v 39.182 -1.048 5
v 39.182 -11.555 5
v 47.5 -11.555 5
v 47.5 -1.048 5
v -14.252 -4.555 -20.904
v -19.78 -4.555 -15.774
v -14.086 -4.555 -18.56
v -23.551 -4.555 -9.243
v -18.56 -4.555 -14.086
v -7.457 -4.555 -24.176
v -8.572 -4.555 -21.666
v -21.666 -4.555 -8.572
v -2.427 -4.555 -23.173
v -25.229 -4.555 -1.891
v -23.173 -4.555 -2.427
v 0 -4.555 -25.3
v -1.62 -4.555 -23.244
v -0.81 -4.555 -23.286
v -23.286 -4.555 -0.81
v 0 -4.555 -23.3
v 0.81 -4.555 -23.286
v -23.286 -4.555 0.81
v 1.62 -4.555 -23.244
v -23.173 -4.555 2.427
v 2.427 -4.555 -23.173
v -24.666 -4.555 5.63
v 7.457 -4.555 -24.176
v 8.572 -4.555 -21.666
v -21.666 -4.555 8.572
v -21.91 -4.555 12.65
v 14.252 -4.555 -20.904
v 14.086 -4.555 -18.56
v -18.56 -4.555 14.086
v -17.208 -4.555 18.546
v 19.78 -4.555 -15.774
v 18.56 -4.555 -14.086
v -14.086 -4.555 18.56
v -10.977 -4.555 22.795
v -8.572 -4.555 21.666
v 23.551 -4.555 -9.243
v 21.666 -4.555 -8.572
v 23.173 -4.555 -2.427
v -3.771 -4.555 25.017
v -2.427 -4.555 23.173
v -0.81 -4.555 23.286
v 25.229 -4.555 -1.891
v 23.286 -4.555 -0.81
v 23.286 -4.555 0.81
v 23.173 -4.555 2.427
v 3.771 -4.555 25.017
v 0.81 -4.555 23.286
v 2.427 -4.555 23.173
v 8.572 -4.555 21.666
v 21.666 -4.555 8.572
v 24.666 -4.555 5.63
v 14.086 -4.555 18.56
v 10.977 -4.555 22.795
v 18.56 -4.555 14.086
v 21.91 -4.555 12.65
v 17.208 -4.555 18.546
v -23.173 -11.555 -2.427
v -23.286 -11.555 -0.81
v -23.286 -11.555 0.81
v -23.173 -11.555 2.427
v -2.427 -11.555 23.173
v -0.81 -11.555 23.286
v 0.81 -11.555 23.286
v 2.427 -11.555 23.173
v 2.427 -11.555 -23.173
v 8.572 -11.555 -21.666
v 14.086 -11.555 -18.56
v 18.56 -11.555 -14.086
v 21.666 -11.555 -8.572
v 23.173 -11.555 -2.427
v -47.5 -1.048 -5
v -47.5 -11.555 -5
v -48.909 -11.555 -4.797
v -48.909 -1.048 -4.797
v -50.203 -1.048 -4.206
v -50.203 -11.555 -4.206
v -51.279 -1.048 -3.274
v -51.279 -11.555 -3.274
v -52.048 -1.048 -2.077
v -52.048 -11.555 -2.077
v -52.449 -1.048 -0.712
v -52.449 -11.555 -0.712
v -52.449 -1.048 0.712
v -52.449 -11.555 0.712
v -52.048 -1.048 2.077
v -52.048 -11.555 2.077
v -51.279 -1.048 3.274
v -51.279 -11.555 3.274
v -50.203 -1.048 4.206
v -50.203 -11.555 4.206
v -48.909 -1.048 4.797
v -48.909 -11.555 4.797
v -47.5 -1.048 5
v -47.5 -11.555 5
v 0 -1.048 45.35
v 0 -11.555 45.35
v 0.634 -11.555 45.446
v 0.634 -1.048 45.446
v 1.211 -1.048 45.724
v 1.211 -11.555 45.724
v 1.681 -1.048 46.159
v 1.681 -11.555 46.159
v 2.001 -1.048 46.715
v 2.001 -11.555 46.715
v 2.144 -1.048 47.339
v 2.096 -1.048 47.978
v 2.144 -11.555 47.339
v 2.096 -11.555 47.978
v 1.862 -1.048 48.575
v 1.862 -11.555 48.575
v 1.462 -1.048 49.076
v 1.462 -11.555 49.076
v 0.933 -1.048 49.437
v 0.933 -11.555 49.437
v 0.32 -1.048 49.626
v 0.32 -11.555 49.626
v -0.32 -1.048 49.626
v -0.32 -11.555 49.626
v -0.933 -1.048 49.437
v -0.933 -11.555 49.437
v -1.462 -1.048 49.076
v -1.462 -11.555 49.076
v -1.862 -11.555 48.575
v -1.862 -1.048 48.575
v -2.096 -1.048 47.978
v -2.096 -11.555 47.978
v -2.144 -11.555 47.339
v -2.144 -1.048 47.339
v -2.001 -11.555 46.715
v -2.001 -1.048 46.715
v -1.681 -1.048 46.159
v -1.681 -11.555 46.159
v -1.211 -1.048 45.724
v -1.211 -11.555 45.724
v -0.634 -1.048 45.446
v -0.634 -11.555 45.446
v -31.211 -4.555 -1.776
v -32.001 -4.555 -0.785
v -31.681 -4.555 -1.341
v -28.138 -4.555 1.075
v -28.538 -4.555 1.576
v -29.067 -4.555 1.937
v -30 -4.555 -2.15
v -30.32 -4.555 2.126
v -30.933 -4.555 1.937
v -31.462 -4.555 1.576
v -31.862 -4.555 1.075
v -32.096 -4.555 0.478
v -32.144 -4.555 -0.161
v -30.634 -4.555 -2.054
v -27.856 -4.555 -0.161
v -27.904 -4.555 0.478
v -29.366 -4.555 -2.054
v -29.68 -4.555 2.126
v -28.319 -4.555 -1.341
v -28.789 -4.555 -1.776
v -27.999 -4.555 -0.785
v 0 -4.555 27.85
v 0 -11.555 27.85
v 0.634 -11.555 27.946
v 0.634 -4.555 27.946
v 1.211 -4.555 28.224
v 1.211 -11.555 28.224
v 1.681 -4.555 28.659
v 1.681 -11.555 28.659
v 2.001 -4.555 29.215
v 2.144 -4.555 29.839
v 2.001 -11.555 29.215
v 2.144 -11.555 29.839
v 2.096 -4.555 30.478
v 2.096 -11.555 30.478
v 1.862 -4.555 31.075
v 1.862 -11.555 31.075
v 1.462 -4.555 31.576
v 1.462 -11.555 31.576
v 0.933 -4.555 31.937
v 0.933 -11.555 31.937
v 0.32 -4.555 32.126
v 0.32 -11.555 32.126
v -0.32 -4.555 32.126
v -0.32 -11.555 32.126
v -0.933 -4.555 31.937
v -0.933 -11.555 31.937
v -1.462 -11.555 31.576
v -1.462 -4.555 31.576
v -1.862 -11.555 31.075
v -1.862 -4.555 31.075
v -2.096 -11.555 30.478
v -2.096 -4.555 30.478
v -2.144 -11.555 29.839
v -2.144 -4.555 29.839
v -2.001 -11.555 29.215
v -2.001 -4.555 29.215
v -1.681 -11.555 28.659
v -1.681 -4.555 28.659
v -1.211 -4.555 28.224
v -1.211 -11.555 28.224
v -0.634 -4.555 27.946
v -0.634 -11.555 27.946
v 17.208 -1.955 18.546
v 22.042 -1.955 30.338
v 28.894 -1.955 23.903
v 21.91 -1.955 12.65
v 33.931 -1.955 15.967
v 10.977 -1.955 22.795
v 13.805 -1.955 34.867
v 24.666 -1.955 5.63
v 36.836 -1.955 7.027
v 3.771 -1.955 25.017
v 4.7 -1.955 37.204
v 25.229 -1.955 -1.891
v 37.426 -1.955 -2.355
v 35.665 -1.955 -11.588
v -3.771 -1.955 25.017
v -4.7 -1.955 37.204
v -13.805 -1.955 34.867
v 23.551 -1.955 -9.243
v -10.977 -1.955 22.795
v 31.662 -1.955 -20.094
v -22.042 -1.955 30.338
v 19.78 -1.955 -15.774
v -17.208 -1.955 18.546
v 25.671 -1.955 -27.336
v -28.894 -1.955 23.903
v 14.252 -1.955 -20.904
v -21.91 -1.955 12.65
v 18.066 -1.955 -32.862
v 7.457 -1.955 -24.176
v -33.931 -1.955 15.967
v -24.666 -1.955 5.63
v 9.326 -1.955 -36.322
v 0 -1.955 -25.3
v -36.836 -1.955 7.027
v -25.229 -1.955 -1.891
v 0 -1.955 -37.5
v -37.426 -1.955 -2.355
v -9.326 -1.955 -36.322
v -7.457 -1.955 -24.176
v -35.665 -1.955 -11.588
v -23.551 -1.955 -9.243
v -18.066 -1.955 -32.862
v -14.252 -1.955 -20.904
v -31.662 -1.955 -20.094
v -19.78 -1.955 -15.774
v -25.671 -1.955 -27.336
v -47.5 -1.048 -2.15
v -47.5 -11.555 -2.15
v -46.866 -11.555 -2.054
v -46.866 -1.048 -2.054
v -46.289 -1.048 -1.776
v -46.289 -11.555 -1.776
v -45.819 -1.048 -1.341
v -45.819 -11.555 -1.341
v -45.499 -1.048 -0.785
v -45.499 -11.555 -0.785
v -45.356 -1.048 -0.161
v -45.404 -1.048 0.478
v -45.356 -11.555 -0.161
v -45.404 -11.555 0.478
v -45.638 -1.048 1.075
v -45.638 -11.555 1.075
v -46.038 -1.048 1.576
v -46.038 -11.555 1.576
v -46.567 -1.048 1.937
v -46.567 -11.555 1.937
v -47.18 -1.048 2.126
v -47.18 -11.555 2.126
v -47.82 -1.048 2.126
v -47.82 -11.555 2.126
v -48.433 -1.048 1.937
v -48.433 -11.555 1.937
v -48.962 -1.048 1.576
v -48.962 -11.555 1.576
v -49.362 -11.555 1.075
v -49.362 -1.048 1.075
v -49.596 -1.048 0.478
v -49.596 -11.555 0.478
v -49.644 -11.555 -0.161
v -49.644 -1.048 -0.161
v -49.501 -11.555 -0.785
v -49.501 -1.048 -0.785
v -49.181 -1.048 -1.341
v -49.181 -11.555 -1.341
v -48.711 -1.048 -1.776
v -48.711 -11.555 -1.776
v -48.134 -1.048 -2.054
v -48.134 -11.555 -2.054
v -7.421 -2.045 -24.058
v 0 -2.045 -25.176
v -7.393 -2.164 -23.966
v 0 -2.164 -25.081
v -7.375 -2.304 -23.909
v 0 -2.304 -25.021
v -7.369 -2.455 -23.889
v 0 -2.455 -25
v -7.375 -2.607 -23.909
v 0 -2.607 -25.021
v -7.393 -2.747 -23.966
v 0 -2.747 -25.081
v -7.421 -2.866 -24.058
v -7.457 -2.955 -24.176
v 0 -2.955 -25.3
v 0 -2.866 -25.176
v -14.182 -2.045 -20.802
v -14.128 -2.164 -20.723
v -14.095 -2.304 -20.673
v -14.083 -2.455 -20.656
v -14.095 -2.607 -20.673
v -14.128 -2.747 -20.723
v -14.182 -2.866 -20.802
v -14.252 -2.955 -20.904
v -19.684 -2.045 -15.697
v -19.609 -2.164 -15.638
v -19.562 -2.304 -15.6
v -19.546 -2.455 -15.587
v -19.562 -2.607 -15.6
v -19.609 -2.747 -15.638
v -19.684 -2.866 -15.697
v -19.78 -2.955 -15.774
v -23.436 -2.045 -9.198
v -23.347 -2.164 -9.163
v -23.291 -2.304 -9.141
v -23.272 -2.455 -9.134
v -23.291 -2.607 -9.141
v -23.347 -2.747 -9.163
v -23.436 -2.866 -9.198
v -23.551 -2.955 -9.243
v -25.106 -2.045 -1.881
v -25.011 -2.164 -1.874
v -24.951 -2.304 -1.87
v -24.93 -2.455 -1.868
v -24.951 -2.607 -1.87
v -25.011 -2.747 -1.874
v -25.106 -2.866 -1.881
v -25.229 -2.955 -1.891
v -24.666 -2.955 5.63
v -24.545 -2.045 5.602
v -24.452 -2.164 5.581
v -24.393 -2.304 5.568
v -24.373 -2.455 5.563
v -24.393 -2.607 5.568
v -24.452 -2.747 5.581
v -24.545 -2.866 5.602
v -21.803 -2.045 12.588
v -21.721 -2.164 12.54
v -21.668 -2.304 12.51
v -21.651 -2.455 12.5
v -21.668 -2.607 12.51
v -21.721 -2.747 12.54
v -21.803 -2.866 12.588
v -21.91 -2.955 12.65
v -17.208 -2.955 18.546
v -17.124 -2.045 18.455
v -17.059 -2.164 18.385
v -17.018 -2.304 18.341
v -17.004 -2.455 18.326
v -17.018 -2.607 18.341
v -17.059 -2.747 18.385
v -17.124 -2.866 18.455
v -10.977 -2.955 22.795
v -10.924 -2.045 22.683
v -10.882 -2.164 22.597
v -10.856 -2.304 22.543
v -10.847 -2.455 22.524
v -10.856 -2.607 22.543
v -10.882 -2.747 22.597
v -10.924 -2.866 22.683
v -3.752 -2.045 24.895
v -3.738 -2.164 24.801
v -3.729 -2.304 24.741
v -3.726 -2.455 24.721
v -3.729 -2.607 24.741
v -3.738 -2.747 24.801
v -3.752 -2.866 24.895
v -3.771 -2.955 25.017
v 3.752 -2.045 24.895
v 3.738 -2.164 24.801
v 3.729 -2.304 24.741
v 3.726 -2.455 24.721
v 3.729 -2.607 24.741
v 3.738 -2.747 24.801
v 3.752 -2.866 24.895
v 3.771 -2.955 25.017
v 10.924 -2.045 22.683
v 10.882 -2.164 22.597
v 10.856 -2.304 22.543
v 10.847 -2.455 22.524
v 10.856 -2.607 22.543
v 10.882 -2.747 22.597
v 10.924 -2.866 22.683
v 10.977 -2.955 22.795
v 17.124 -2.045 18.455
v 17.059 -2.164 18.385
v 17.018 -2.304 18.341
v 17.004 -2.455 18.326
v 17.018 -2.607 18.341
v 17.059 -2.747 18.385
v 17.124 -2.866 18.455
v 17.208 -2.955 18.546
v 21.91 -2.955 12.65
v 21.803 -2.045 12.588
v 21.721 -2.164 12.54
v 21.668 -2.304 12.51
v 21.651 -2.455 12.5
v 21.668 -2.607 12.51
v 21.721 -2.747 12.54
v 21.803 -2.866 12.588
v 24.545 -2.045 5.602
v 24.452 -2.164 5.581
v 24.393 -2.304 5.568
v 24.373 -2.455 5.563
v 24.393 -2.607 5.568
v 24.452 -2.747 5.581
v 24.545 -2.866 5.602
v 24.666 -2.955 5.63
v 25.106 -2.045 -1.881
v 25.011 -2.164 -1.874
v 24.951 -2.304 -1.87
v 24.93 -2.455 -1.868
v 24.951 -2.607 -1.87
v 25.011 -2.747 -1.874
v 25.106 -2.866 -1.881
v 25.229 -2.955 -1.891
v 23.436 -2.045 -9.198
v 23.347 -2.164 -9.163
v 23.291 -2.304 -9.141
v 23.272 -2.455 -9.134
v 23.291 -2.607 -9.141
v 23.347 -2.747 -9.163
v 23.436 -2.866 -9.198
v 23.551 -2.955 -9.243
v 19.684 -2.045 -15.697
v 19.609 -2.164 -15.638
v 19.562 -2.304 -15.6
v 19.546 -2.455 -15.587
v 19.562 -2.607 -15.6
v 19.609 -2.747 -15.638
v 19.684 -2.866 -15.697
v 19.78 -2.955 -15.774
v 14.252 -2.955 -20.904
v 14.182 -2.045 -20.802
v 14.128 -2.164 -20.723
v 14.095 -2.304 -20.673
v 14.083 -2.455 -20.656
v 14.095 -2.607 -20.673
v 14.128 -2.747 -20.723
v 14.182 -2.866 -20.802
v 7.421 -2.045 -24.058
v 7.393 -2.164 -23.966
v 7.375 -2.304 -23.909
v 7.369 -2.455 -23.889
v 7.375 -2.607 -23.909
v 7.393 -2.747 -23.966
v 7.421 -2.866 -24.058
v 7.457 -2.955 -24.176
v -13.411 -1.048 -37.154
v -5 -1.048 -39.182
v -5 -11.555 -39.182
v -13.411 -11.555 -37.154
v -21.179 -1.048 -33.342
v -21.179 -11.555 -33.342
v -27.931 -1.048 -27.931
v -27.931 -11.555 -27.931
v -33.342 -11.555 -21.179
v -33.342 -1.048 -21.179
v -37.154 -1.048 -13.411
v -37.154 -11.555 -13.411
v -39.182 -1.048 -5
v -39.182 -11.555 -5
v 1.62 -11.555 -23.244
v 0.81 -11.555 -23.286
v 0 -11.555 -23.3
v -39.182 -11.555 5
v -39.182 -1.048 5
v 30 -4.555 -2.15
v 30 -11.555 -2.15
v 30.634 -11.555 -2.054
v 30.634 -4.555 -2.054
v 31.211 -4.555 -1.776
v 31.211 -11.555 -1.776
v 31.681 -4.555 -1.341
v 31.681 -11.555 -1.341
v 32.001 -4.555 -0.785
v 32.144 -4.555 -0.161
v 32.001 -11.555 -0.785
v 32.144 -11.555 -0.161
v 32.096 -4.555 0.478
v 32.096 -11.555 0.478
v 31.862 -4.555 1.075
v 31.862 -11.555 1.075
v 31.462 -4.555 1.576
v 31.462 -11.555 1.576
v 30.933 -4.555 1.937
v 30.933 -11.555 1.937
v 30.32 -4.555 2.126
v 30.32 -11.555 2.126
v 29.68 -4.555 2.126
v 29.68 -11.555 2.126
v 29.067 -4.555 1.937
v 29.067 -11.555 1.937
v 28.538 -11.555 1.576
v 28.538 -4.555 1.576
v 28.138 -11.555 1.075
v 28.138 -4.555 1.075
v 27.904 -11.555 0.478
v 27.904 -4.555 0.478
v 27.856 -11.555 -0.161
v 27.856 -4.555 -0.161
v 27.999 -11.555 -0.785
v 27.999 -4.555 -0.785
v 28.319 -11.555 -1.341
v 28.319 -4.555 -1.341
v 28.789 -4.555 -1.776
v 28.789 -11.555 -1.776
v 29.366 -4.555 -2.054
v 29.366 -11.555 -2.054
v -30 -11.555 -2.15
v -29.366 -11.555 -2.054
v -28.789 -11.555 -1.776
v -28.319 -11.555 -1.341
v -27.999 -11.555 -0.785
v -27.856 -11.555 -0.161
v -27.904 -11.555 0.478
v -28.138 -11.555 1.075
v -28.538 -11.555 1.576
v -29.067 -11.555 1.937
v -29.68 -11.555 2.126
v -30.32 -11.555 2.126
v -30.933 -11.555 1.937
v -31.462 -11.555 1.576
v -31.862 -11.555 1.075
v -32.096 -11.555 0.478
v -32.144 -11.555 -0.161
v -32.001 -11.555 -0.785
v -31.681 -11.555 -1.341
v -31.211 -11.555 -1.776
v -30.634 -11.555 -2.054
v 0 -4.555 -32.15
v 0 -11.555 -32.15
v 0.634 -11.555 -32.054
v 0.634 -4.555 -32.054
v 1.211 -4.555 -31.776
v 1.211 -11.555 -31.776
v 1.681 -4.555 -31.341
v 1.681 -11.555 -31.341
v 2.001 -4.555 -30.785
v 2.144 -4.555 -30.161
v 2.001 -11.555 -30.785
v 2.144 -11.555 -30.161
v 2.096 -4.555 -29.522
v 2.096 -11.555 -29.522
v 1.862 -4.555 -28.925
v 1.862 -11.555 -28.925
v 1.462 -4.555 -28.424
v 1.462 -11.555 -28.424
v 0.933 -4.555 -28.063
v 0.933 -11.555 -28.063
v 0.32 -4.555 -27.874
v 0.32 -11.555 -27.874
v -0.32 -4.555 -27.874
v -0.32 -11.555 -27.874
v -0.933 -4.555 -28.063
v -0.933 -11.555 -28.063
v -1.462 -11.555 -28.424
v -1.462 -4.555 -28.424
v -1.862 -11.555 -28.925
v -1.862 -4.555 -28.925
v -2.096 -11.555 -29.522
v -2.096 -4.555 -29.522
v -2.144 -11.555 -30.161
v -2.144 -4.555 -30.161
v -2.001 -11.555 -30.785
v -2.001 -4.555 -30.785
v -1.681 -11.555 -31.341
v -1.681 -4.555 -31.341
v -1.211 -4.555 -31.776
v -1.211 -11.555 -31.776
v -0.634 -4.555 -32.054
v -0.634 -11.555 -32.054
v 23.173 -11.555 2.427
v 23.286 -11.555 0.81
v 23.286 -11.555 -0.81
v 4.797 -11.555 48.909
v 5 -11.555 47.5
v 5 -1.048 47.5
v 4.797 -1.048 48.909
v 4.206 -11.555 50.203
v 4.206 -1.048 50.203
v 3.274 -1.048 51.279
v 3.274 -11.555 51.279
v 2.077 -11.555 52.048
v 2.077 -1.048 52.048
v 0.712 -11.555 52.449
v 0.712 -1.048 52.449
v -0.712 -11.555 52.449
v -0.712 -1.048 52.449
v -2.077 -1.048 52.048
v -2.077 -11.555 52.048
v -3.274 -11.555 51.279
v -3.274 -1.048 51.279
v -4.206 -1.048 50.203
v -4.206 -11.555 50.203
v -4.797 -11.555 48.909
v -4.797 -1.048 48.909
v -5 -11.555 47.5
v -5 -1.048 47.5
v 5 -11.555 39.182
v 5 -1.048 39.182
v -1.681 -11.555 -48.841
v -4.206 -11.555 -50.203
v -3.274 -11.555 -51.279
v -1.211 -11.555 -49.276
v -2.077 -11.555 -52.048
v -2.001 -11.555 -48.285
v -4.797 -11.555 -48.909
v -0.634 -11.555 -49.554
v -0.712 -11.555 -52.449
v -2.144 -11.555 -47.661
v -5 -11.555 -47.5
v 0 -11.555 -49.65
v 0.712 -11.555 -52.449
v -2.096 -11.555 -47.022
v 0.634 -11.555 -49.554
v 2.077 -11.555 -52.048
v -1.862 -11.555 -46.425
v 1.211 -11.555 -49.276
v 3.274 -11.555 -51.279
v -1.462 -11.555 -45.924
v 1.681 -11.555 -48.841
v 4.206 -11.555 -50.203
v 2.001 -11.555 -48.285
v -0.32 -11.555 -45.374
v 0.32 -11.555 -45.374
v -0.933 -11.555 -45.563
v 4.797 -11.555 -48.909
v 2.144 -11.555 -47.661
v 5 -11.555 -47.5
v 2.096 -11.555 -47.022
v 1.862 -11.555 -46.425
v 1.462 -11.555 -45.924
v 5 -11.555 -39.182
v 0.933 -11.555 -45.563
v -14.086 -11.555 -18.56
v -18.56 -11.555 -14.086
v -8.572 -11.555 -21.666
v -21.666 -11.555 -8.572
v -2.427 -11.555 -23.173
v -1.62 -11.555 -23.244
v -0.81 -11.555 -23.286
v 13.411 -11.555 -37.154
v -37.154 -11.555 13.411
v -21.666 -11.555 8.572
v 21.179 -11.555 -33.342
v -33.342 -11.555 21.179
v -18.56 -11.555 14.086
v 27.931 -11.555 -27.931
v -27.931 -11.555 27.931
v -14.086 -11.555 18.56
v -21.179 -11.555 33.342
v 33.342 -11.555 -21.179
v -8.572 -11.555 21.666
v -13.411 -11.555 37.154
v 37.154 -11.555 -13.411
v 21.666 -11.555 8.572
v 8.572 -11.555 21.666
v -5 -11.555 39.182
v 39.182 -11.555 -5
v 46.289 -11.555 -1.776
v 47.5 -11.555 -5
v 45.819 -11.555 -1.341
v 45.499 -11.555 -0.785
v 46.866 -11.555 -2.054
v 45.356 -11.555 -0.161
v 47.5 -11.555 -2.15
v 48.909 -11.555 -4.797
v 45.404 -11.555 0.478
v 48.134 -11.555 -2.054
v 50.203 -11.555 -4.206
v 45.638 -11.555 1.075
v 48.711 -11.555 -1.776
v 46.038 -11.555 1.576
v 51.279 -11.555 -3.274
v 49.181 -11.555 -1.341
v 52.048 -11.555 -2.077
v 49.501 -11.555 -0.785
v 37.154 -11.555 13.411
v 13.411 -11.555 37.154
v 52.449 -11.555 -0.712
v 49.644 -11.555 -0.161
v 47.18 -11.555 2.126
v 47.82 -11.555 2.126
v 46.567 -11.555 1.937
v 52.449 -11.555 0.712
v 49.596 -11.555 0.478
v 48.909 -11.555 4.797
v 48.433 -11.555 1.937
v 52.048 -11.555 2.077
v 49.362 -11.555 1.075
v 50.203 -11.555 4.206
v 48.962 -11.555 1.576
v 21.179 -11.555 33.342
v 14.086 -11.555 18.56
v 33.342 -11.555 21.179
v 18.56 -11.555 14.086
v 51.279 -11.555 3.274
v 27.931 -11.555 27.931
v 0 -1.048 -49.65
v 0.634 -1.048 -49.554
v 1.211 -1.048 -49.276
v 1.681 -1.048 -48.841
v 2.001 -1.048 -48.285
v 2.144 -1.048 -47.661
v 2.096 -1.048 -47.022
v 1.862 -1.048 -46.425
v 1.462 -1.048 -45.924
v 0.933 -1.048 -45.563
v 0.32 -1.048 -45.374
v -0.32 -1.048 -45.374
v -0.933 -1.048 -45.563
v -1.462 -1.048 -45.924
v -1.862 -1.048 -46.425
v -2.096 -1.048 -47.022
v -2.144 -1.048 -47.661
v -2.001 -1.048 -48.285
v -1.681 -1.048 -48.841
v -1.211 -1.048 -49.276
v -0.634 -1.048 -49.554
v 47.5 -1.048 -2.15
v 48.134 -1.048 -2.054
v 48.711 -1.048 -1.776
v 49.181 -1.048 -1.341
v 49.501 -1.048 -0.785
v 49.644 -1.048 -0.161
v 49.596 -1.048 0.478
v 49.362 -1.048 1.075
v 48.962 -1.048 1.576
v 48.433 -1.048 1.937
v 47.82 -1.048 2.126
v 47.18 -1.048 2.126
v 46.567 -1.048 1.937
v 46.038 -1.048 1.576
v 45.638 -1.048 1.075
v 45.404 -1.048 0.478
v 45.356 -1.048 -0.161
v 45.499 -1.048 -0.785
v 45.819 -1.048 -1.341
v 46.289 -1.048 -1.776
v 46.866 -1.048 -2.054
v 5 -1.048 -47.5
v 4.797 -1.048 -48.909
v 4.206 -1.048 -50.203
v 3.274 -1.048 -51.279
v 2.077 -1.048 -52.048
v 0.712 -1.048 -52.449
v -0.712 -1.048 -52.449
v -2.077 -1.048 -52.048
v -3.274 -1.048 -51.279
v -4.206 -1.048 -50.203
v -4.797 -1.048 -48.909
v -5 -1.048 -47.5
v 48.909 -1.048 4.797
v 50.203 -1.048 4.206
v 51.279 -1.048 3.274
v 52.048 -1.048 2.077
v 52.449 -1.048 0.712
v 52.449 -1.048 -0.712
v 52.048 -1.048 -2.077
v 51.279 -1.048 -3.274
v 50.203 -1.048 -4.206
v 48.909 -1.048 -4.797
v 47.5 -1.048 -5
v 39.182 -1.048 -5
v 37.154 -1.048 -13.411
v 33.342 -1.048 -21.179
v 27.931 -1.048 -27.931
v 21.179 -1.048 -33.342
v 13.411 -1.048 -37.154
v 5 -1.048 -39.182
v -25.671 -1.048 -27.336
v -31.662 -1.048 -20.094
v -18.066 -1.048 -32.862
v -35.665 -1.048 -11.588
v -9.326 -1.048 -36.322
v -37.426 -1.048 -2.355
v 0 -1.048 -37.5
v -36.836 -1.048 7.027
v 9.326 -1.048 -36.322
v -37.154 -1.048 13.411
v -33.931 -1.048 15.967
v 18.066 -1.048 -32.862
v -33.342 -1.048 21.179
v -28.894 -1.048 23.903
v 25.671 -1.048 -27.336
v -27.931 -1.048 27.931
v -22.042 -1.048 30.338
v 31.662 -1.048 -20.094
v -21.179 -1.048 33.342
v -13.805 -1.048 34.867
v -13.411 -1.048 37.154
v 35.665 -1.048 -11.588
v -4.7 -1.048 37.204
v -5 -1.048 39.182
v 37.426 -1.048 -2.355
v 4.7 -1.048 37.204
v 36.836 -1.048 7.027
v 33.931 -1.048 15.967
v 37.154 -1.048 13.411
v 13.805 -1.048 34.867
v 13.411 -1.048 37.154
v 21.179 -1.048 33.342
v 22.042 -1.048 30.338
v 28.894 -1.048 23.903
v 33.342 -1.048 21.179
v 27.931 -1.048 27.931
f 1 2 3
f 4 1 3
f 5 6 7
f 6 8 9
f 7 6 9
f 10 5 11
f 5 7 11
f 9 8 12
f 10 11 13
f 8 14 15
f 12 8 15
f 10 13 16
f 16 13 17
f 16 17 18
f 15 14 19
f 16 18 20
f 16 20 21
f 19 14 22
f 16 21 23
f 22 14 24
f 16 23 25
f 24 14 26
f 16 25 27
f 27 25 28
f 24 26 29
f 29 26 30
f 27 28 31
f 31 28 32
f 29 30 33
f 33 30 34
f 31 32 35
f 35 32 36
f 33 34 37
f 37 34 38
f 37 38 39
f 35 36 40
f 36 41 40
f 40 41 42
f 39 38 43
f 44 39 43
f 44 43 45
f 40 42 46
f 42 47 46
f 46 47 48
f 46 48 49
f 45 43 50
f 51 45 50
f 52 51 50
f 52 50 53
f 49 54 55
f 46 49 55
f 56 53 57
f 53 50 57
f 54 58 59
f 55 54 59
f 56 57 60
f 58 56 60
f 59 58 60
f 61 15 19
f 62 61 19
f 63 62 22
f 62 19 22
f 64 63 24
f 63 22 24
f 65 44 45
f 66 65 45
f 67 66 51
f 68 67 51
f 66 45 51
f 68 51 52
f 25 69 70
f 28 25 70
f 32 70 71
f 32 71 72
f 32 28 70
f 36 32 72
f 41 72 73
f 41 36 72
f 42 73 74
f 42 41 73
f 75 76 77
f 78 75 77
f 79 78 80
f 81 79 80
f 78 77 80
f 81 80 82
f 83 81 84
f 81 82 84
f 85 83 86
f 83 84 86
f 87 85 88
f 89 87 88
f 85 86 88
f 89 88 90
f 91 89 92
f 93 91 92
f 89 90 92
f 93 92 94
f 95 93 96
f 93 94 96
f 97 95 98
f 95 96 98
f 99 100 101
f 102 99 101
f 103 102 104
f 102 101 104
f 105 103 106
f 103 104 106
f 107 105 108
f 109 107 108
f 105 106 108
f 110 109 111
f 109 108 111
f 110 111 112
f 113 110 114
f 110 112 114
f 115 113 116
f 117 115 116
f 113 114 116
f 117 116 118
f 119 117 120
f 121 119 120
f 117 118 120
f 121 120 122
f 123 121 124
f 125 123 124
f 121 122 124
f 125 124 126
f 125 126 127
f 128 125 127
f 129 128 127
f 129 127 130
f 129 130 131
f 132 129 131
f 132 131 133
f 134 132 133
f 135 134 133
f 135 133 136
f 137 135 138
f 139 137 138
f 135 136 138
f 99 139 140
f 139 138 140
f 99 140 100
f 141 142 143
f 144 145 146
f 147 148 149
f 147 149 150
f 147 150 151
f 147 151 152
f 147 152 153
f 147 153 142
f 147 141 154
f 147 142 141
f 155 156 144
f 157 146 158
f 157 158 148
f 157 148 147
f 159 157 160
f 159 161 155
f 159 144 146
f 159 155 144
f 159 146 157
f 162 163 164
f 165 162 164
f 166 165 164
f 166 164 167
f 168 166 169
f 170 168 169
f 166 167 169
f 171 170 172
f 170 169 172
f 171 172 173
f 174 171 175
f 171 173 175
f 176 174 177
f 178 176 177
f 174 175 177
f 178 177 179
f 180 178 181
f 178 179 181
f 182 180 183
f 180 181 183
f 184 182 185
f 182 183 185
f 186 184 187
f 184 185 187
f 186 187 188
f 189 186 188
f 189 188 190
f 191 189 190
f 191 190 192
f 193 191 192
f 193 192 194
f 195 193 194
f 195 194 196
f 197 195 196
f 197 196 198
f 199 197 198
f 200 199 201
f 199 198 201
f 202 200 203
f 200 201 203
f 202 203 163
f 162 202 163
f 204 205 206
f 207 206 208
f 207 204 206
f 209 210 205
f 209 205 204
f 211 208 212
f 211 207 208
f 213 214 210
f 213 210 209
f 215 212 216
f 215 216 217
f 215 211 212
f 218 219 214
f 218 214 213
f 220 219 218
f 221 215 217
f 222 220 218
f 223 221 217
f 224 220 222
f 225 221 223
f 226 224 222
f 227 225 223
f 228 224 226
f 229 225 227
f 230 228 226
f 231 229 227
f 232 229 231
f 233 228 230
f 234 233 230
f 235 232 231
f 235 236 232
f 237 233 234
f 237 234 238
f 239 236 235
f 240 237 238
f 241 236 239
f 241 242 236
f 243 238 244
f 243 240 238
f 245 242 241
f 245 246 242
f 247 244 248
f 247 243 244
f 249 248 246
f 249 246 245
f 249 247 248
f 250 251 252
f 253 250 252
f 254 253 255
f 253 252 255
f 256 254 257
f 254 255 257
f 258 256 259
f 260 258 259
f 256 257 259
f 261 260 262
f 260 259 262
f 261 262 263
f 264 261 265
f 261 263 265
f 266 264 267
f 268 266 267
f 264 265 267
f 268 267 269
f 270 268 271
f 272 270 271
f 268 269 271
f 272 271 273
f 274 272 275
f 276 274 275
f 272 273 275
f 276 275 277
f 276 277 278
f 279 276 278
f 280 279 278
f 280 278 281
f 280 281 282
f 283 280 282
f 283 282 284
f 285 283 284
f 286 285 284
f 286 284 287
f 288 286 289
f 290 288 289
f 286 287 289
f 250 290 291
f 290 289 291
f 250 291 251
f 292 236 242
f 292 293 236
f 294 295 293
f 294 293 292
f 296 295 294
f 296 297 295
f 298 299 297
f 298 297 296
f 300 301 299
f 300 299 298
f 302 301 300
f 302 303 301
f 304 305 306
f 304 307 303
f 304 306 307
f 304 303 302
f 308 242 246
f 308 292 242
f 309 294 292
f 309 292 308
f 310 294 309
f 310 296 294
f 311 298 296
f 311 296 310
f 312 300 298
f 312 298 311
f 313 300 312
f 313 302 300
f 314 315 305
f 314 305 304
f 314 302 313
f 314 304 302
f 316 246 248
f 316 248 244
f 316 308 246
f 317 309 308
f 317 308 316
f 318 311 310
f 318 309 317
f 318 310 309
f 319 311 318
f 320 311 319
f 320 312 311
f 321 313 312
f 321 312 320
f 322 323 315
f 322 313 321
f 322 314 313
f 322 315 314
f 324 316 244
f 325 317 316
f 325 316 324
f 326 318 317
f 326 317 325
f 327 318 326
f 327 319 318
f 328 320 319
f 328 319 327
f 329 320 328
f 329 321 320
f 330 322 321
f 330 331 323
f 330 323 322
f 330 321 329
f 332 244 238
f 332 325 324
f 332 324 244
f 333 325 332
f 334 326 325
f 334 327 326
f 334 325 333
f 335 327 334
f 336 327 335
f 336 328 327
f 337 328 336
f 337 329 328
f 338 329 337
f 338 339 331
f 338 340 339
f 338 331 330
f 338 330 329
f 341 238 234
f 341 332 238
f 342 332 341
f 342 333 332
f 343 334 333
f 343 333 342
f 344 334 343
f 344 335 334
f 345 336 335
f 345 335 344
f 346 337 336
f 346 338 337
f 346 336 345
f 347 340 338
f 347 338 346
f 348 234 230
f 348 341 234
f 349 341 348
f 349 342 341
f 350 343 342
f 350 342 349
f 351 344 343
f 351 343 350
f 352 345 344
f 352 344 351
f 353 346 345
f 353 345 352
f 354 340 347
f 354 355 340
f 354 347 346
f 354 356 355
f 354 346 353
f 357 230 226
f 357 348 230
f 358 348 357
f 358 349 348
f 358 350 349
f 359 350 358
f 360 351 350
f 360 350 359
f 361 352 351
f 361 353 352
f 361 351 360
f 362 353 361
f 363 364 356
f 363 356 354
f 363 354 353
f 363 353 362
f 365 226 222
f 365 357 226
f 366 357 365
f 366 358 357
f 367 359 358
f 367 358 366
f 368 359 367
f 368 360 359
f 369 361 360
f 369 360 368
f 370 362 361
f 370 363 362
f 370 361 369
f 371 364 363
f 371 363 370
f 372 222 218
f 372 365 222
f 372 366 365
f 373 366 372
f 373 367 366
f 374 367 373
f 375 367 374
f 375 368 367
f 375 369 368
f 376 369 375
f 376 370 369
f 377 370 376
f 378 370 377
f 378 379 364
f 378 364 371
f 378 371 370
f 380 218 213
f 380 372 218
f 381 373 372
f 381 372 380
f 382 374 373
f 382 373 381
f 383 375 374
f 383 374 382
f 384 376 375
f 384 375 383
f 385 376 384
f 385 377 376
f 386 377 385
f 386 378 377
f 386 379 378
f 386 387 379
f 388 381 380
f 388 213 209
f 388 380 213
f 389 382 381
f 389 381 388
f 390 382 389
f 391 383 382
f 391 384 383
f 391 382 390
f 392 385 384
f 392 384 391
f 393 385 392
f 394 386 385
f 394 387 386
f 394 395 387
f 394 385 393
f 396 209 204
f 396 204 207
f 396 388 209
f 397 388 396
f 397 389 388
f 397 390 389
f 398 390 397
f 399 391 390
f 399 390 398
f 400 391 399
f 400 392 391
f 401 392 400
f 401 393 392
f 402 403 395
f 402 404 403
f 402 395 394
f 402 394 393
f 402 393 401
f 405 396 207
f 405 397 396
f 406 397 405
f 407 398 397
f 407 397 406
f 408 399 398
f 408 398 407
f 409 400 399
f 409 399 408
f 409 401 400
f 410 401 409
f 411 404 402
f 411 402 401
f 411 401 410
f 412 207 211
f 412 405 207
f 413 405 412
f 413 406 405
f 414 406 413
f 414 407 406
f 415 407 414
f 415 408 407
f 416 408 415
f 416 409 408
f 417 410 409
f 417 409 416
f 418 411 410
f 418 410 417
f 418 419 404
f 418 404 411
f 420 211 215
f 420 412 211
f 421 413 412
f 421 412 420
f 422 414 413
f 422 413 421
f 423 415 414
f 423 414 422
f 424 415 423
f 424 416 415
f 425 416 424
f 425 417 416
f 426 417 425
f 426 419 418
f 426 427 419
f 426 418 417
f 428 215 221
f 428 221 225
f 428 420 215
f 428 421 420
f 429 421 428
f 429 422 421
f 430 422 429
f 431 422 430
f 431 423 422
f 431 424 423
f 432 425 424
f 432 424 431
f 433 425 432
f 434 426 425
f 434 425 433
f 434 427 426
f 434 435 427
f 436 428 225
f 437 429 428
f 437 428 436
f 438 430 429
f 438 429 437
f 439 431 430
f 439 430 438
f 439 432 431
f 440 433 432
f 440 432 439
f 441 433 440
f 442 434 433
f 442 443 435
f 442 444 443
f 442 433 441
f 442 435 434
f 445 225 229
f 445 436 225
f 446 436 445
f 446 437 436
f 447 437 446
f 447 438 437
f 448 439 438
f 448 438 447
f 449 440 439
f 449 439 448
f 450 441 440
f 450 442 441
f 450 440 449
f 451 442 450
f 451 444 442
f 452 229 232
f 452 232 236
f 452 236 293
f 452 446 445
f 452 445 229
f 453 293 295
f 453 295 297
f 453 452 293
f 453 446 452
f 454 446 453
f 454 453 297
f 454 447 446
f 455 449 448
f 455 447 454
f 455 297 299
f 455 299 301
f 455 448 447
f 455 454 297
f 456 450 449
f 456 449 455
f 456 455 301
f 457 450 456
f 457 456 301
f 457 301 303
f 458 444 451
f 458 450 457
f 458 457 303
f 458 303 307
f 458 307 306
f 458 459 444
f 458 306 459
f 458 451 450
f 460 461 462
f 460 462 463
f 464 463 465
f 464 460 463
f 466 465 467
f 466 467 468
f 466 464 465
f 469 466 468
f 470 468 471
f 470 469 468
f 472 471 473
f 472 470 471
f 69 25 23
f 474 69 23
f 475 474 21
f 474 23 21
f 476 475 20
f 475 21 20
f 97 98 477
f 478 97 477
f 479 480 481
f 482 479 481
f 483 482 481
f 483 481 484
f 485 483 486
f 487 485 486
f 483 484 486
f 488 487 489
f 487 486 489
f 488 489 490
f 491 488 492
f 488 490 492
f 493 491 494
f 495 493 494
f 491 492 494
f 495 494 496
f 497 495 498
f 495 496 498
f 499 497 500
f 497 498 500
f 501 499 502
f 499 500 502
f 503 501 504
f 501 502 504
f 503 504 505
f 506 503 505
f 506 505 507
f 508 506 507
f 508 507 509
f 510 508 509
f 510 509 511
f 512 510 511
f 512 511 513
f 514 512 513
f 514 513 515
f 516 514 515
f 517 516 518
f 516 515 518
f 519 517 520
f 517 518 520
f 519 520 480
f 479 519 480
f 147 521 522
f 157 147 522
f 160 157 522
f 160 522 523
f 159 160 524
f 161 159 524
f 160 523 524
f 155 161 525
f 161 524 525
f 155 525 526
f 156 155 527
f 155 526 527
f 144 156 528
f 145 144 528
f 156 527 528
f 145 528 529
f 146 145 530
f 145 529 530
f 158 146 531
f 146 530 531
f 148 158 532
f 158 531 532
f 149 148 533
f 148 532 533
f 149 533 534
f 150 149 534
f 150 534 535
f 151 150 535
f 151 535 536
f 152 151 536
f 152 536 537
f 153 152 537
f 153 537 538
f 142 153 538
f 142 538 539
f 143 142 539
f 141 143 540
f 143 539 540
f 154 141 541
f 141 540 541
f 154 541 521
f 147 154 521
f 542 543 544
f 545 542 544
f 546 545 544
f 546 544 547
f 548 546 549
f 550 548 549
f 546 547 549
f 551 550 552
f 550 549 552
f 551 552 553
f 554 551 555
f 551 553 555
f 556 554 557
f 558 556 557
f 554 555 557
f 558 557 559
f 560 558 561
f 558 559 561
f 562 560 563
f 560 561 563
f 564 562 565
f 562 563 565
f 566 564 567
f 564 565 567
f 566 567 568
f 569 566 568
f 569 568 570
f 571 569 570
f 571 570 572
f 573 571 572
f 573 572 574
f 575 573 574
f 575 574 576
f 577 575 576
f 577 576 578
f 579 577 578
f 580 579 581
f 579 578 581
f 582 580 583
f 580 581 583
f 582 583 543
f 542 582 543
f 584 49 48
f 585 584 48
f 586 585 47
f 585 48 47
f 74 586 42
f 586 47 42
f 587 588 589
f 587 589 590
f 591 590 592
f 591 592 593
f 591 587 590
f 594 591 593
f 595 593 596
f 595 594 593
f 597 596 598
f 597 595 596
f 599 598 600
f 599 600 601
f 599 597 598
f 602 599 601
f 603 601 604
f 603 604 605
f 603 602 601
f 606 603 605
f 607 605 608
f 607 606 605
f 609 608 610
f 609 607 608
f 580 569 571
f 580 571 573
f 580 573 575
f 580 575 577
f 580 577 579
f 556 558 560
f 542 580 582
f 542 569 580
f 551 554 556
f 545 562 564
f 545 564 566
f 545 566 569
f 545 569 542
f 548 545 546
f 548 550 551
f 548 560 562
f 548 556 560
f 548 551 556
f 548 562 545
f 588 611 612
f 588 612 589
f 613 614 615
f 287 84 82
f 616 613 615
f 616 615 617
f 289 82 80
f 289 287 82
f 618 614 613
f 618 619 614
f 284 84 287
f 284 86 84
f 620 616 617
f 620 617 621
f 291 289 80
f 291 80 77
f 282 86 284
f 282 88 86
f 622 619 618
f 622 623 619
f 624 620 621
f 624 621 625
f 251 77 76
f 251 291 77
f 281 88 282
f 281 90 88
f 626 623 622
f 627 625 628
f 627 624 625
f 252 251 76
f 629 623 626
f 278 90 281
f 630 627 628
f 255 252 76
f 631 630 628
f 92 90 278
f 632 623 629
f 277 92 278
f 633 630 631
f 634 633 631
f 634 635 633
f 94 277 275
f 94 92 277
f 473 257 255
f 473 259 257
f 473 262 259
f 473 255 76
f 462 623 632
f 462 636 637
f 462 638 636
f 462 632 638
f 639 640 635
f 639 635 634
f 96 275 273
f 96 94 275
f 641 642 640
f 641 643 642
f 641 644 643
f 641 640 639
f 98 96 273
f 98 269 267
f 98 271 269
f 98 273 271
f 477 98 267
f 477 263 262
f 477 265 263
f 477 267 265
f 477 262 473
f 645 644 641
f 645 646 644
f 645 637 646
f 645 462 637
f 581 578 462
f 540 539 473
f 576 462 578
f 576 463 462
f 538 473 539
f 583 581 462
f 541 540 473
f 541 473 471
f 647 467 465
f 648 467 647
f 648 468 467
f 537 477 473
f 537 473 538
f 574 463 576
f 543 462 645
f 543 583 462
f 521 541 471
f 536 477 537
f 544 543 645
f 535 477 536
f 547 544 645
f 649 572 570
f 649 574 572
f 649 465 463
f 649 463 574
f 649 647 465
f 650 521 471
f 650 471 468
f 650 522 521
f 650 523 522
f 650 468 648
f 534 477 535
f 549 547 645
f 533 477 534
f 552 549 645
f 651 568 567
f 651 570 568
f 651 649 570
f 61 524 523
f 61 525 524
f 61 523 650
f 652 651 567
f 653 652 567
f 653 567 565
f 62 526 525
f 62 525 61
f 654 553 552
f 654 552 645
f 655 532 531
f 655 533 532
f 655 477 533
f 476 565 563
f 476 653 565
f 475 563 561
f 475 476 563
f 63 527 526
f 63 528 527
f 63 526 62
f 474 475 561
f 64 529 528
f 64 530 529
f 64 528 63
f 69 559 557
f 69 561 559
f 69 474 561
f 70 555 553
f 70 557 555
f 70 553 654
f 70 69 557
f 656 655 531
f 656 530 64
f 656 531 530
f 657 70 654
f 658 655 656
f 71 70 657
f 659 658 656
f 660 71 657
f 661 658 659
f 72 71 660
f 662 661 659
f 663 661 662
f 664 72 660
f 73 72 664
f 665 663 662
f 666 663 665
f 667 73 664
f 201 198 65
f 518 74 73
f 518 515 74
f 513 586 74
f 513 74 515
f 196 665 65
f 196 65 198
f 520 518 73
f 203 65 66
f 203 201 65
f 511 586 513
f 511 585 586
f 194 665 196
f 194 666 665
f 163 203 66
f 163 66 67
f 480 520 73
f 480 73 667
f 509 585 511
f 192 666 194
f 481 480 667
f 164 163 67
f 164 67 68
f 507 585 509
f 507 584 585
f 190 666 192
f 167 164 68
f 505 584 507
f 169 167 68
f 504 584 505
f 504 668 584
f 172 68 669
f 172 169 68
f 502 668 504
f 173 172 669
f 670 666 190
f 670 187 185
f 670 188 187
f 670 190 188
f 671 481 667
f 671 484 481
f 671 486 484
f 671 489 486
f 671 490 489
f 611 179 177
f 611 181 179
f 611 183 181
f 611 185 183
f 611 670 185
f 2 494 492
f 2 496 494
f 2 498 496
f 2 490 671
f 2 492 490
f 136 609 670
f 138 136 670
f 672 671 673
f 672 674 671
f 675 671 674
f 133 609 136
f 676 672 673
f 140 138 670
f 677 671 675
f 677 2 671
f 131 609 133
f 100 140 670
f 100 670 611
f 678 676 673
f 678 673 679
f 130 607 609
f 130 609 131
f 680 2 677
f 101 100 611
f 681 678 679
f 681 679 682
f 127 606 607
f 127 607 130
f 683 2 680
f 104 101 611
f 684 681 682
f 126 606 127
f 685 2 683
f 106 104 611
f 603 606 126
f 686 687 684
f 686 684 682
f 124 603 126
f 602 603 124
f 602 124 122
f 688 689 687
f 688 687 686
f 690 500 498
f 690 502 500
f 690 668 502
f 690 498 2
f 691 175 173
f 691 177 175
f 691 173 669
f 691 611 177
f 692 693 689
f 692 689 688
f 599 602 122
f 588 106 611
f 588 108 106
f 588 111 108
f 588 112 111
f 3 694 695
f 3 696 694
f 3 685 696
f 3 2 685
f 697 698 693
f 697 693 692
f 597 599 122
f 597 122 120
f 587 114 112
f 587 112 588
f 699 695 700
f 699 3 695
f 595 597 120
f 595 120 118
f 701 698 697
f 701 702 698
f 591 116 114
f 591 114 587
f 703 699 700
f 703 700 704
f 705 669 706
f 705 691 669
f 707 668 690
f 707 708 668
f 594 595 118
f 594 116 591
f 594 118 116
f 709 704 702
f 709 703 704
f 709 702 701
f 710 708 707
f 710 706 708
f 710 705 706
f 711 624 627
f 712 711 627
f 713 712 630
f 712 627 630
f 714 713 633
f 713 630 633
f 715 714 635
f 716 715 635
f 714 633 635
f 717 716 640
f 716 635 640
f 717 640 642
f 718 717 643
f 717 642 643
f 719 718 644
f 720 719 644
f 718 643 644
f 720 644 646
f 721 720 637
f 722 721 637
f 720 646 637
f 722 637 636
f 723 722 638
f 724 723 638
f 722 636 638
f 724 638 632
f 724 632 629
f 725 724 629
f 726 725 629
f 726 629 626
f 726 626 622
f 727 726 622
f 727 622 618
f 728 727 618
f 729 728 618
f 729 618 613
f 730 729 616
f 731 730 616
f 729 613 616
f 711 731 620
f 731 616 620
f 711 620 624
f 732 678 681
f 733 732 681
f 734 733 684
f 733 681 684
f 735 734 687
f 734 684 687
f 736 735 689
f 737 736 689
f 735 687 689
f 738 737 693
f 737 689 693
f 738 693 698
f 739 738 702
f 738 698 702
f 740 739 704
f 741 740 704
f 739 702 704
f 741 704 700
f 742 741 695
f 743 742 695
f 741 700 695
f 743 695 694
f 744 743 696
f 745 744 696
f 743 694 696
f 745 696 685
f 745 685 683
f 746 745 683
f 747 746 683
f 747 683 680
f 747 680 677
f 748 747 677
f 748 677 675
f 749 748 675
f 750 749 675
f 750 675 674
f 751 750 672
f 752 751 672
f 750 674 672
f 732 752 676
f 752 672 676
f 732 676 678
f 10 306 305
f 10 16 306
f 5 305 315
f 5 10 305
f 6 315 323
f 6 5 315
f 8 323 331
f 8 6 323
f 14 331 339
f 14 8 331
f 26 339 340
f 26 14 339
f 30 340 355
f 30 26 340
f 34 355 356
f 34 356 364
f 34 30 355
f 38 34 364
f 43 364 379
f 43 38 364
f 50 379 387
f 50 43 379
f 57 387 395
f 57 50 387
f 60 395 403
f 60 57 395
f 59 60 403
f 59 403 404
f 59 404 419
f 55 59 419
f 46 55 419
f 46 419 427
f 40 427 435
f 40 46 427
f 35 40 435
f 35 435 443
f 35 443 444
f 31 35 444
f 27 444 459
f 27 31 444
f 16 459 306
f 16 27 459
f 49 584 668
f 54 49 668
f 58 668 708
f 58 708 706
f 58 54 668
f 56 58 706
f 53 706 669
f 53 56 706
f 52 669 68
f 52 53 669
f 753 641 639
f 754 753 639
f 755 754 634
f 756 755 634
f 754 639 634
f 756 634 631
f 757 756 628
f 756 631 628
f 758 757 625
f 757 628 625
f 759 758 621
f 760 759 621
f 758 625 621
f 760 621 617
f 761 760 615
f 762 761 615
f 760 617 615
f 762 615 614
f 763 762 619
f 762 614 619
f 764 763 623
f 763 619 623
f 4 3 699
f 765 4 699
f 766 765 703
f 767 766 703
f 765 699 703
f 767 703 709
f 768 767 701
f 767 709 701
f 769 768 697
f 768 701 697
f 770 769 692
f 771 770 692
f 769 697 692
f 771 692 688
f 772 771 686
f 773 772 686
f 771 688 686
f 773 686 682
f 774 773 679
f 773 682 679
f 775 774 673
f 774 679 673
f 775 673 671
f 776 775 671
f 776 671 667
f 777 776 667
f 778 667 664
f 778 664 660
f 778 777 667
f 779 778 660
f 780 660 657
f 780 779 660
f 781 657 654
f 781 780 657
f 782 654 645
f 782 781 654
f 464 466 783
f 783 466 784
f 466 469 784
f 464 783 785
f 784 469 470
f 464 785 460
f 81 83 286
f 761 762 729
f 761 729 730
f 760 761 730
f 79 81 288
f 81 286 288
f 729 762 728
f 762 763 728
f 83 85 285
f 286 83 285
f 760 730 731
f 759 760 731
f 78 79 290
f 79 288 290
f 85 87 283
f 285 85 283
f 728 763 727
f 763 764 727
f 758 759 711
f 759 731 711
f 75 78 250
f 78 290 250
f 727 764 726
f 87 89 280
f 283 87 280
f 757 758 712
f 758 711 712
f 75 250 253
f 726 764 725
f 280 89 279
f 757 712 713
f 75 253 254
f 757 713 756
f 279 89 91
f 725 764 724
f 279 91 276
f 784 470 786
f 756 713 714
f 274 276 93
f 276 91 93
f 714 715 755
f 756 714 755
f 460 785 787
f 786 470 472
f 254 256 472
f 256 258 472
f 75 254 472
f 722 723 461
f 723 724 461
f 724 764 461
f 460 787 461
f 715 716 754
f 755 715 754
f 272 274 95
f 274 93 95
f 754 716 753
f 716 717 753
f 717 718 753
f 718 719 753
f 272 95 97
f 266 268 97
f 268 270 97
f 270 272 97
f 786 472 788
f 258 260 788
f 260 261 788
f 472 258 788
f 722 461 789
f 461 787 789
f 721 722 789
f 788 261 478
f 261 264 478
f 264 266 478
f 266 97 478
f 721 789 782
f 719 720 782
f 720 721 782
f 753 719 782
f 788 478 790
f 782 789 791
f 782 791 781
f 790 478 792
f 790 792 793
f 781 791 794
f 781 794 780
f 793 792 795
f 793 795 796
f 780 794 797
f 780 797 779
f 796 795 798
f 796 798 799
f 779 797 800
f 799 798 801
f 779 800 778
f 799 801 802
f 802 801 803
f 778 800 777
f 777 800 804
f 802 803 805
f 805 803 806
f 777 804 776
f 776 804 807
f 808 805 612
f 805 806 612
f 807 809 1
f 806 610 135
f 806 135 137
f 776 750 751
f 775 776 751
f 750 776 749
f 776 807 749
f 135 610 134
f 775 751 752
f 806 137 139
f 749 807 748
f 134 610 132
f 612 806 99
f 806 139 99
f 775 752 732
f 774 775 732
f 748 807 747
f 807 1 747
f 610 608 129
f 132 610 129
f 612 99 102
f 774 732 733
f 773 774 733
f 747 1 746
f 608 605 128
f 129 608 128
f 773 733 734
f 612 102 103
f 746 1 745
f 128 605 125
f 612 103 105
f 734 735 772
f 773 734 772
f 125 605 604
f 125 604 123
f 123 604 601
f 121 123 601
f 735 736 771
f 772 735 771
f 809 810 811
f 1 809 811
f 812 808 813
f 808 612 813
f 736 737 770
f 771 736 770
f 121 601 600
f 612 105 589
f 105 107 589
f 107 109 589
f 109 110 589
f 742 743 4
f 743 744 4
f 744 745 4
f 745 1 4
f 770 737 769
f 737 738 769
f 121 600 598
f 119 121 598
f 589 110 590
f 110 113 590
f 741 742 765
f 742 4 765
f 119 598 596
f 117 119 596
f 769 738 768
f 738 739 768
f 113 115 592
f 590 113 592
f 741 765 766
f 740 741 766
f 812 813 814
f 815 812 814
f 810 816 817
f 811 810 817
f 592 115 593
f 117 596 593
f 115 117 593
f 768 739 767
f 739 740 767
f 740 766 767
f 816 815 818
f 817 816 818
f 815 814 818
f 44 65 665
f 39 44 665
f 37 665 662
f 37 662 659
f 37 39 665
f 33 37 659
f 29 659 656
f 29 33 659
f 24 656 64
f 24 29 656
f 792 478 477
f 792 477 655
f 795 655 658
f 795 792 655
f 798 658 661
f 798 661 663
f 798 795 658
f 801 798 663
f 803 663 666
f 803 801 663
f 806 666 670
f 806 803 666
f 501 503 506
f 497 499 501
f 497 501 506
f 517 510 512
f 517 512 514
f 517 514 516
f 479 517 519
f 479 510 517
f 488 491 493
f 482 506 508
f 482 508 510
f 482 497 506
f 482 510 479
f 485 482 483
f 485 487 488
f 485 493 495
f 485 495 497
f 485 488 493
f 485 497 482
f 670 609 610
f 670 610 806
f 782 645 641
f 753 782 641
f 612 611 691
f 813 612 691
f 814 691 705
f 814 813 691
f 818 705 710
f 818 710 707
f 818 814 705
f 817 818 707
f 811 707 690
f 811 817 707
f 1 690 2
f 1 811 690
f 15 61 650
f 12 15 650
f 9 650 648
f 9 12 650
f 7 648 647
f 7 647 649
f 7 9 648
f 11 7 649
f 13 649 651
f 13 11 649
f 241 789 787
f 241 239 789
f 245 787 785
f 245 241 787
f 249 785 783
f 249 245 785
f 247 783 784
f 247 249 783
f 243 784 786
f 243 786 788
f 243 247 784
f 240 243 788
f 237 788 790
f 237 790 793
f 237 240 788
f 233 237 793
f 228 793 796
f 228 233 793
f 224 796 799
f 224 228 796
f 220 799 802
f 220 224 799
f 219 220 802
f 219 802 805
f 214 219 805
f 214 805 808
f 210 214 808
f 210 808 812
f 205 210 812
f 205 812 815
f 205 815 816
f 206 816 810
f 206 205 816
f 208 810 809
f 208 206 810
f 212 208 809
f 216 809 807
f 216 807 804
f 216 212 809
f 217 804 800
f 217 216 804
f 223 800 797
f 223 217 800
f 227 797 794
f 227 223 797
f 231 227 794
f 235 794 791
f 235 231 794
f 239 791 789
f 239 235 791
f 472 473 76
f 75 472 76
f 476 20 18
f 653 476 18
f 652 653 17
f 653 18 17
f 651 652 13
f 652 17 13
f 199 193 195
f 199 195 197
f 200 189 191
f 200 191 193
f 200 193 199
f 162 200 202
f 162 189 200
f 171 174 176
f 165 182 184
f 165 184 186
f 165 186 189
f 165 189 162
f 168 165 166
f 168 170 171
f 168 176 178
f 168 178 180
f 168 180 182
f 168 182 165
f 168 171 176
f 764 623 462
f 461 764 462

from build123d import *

# Parameters (mm, degrees)
SKETCH2_R           = 2.15
BOSS_EXTRUDE1_DEPTH = 10.507214
CUT_EXTRUDE2_DEPTH  = 7
SKETCH4_R           = 2.15
CUT_EXTRUDE3_DEPTH  = 7
BOSS_EXTRUDE2_START = -7
SKETCH5_R           = 24.3
SKETCH5_R_2         = 23.3
BOSS_EXTRUDE2_DEPTH = 7
SKETCH6_R           = 23.3
CUT_EXTRUDE4_DEPTH  = 75.575465


with BuildPart() as part:
    # Sketch1 → Revolve1 (revolve)
    with BuildSketch(Plane(origin=(0, 0, 0), x_dir=(0, 0, -1), z_dir=(1, 0, 0)), mode=Mode.PRIVATE) as revolve1_sk:
        with BuildLine():
            Line((-37.5, -1.048229), (-37.5, -1.955443))
            Line((-37.5, -1.955443), (-25.3, -1.955443))
            ThreePointArc((-25.3, -1.955443), (-25, -2.455443), (-25.3, -2.955443))
            Line((-25.3, -2.955443), (-25.3, -4.555443))
            Line((-25.3, -4.555443), (-8, -4.555443))
            Line((-8, -4.555443), (-8, -11.555443))
            Line((-8, -11.555443), (-39.5, -11.555443))
            Line((-39.5, -11.555443), (-39.5, -1.048229))
            Line((-39.5, -1.048229), (-37.5, -1.048229))
        make_face()
    revolve(revolve1_sk.sketch.rotate(Axis((0, -1000, 0), (0, 1, 0)), 180), axis=Axis((0, -1000, 0), (0, 1, 0)))

    # Sketch2 → Boss-Extrude1 (add)
    # profile 1 of 4: a face of its own
    with BuildSketch(Plane.XZ.offset(11.555443)):
        with BuildLine():
            Line((-5, 47.5), (-5, 39.182266))
            Line((-5, 39.182266), (5, 39.182266))
            Line((5, 39.182266), (5, 47.5))
            ThreePointArc((5, 47.5), (0, 52.5), (-5, 47.5))
        make_face()
        with Locations(Location((0, 47.5, 0), (0, 0, 270))):
            Circle(SKETCH2_R, mode=Mode.SUBTRACT)
    # profile 2 of 4: a face of its own
    with BuildSketch(Plane.XZ.offset(11.555443)):
        with BuildLine():
            Line((47.5, -5), (39.182266, -5))
            Line((39.182266, -5), (39.182266, 5))
            Line((39.182266, 5), (47.5, 5))
            ThreePointArc((47.5, 5), (52.5, 0), (47.5, -5))
        make_face()
        with Locations(Location((47.5, 0, 0), (0, 0, 270))):
            Circle(SKETCH2_R, mode=Mode.SUBTRACT)
    # profile 3 of 4: a face of its own
    with BuildSketch(Plane.XZ.offset(11.555443)):
        with BuildLine():
            Line((-5, -47.5), (-5, -39.182266))
            Line((-5, -39.182266), (5, -39.182266))
            Line((5, -39.182266), (5, -47.5))
            ThreePointArc((5, -47.5), (0, -52.5), (-5, -47.5))
        make_face()
        with Locations(Location((0, -47.5, 0), (0, 0, 270))):
            Circle(SKETCH2_R, mode=Mode.SUBTRACT)
    # profile 4 of 4: a face of its own
    with BuildSketch(Plane.XZ.offset(11.555443)):
        with BuildLine():
            Line((-47.5, 5), (-39.182266, 5))
            Line((-39.182266, 5), (-39.182266, -5))
            Line((-39.182266, -5), (-47.5, -5))
            ThreePointArc((-47.5, -5), (-52.5, 0), (-47.5, 5))
        make_face()
        with Locations(Location((-47.5, 0, 0), (0, 0, 270))):
            Circle(SKETCH2_R, mode=Mode.SUBTRACT)
    extrude(amount=-BOSS_EXTRUDE1_DEPTH)

    # Sketch3 → Cut-Extrude2 (cut)
    with BuildSketch(Plane(origin=(0, -4.555443, 0), x_dir=(1, 0, 0), z_dir=(0, 1, 0))):
        with BuildLine():
            Line((21.938323, -2), (12.369317, -2))
            ThreePointArc((12.369317, -2), (11.19262, -2.382785), (10.466345, -3.384615))
            ThreePointArc((10.466345, -3.384615), (7.778175, -7.778175), (3.384615, -10.466345))
            ThreePointArc((3.384615, -10.466345), (2.382785, -11.19262), (2, -12.369317))
            Line((2, -12.369317), (2, -21.938323))
            ThreePointArc((2, -21.938323), (2.718885, -23.474143), (4.358744, -23.905885))
            ThreePointArc((4.358744, -23.905885), (17.182695, -17.182695), (23.905885, -4.358744))
            ThreePointArc((23.905885, -4.358744), (23.474143, -2.718885), (21.938323, -2))
        make_face()
        with BuildLine():
            Line((-2, -21.938323), (-2, -12.369317))
            ThreePointArc((-2, -12.369317), (-2.382785, -11.19262), (-3.384615, -10.466345))
            ThreePointArc((-3.384615, -10.466345), (-7.778175, -7.778175), (-10.466345, -3.384615))
            ThreePointArc((-10.466345, -3.384615), (-11.19262, -2.382785), (-12.369317, -2))
            Line((-12.369317, -2), (-21.938323, -2))
            ThreePointArc((-21.938323, -2), (-23.474143, -2.718885), (-23.905885, -4.358744))
            ThreePointArc((-23.905885, -4.358744), (-17.182695, -17.182695), (-4.358744, -23.905885))
            ThreePointArc((-4.358744, -23.905885), (-2.718885, -23.474143), (-2, -21.938323))
        make_face()
        with BuildLine():
            Line((-21.938323, 2), (-12.369317, 2))
            ThreePointArc((-12.369317, 2), (-11.19262, 2.382785), (-10.466345, 3.384615))
            ThreePointArc((-10.466345, 3.384615), (-7.778175, 7.778175), (-3.384615, 10.466345))
            ThreePointArc((-3.384615, 10.466345), (-2.382785, 11.19262), (-2, 12.369317))
            Line((-2, 12.369317), (-2, 21.938323))
            ThreePointArc((-2, 21.938323), (-2.718885, 23.474143), (-4.358744, 23.905885))
            ThreePointArc((-4.358744, 23.905885), (-17.182695, 17.182695), (-23.905885, 4.358744))
            ThreePointArc((-23.905885, 4.358744), (-23.474143, 2.718885), (-21.938323, 2))
        make_face()
        with BuildLine():
            Line((2, 21.938323), (2, 12.369317))
            ThreePointArc((2, 12.369317), (2.382785, 11.19262), (3.384615, 10.466345))
            ThreePointArc((3.384615, 10.466345), (7.778175, 7.778175), (10.466345, 3.384615))
            ThreePointArc((10.466345, 3.384615), (11.19262, 2.382785), (12.369317, 2))
            Line((12.369317, 2), (21.938323, 2))
            ThreePointArc((21.938323, 2), (23.474143, 2.718885), (23.905885, 4.358744))
            ThreePointArc((23.905885, 4.358744), (17.182695, 17.182695), (4.358744, 23.905885))
            ThreePointArc((4.358744, 23.905885), (2.718885, 23.474143), (2, 21.938323))
        make_face()
    extrude(amount=-CUT_EXTRUDE2_DEPTH, mode=Mode.SUBTRACT)

    # Sketch4 → Cut-Extrude3 (cut)
    with BuildSketch(Plane(origin=(0, -11.555443, 0), x_dir=(-1, 0, 0), z_dir=(0, -1, 0))):
        with Locations(Location((30, 0, 0), (0, 0, 90))):
            Circle(SKETCH4_R)
        with Locations(Location((0, -30, 0), (0, 0, 90))):
            Circle(SKETCH4_R)
        with Locations(Location((-30, 0, 0), (0, 0, 90))):
            Circle(SKETCH4_R)
        with Locations(Location((0, 30, 0), (0, 0, 90))):
            Circle(SKETCH4_R)
    extrude(amount=-CUT_EXTRUDE3_DEPTH, mode=Mode.SUBTRACT)

    # Sketch5 → Boss-Extrude2 (add)
    with BuildSketch(Plane.XZ.offset(11.555443).offset(BOSS_EXTRUDE2_START)):
        Circle(SKETCH5_R)
        Circle(SKETCH5_R_2, mode=Mode.SUBTRACT)
    extrude(amount=BOSS_EXTRUDE2_DEPTH)

    # Sketch6 → Cut-Extrude4 (cut, through all)
    with BuildSketch(Plane(origin=(0, -4.555443, 0), x_dir=(1, 0, 0), z_dir=(0, 1, 0))):
        with Locations(Location((0, 0, 0), (0, 0, 90))):
            Circle(SKETCH6_R)
    extrude(amount=-CUT_EXTRUDE4_DEPTH, mode=Mode.SUBTRACT)


solid = part.part
